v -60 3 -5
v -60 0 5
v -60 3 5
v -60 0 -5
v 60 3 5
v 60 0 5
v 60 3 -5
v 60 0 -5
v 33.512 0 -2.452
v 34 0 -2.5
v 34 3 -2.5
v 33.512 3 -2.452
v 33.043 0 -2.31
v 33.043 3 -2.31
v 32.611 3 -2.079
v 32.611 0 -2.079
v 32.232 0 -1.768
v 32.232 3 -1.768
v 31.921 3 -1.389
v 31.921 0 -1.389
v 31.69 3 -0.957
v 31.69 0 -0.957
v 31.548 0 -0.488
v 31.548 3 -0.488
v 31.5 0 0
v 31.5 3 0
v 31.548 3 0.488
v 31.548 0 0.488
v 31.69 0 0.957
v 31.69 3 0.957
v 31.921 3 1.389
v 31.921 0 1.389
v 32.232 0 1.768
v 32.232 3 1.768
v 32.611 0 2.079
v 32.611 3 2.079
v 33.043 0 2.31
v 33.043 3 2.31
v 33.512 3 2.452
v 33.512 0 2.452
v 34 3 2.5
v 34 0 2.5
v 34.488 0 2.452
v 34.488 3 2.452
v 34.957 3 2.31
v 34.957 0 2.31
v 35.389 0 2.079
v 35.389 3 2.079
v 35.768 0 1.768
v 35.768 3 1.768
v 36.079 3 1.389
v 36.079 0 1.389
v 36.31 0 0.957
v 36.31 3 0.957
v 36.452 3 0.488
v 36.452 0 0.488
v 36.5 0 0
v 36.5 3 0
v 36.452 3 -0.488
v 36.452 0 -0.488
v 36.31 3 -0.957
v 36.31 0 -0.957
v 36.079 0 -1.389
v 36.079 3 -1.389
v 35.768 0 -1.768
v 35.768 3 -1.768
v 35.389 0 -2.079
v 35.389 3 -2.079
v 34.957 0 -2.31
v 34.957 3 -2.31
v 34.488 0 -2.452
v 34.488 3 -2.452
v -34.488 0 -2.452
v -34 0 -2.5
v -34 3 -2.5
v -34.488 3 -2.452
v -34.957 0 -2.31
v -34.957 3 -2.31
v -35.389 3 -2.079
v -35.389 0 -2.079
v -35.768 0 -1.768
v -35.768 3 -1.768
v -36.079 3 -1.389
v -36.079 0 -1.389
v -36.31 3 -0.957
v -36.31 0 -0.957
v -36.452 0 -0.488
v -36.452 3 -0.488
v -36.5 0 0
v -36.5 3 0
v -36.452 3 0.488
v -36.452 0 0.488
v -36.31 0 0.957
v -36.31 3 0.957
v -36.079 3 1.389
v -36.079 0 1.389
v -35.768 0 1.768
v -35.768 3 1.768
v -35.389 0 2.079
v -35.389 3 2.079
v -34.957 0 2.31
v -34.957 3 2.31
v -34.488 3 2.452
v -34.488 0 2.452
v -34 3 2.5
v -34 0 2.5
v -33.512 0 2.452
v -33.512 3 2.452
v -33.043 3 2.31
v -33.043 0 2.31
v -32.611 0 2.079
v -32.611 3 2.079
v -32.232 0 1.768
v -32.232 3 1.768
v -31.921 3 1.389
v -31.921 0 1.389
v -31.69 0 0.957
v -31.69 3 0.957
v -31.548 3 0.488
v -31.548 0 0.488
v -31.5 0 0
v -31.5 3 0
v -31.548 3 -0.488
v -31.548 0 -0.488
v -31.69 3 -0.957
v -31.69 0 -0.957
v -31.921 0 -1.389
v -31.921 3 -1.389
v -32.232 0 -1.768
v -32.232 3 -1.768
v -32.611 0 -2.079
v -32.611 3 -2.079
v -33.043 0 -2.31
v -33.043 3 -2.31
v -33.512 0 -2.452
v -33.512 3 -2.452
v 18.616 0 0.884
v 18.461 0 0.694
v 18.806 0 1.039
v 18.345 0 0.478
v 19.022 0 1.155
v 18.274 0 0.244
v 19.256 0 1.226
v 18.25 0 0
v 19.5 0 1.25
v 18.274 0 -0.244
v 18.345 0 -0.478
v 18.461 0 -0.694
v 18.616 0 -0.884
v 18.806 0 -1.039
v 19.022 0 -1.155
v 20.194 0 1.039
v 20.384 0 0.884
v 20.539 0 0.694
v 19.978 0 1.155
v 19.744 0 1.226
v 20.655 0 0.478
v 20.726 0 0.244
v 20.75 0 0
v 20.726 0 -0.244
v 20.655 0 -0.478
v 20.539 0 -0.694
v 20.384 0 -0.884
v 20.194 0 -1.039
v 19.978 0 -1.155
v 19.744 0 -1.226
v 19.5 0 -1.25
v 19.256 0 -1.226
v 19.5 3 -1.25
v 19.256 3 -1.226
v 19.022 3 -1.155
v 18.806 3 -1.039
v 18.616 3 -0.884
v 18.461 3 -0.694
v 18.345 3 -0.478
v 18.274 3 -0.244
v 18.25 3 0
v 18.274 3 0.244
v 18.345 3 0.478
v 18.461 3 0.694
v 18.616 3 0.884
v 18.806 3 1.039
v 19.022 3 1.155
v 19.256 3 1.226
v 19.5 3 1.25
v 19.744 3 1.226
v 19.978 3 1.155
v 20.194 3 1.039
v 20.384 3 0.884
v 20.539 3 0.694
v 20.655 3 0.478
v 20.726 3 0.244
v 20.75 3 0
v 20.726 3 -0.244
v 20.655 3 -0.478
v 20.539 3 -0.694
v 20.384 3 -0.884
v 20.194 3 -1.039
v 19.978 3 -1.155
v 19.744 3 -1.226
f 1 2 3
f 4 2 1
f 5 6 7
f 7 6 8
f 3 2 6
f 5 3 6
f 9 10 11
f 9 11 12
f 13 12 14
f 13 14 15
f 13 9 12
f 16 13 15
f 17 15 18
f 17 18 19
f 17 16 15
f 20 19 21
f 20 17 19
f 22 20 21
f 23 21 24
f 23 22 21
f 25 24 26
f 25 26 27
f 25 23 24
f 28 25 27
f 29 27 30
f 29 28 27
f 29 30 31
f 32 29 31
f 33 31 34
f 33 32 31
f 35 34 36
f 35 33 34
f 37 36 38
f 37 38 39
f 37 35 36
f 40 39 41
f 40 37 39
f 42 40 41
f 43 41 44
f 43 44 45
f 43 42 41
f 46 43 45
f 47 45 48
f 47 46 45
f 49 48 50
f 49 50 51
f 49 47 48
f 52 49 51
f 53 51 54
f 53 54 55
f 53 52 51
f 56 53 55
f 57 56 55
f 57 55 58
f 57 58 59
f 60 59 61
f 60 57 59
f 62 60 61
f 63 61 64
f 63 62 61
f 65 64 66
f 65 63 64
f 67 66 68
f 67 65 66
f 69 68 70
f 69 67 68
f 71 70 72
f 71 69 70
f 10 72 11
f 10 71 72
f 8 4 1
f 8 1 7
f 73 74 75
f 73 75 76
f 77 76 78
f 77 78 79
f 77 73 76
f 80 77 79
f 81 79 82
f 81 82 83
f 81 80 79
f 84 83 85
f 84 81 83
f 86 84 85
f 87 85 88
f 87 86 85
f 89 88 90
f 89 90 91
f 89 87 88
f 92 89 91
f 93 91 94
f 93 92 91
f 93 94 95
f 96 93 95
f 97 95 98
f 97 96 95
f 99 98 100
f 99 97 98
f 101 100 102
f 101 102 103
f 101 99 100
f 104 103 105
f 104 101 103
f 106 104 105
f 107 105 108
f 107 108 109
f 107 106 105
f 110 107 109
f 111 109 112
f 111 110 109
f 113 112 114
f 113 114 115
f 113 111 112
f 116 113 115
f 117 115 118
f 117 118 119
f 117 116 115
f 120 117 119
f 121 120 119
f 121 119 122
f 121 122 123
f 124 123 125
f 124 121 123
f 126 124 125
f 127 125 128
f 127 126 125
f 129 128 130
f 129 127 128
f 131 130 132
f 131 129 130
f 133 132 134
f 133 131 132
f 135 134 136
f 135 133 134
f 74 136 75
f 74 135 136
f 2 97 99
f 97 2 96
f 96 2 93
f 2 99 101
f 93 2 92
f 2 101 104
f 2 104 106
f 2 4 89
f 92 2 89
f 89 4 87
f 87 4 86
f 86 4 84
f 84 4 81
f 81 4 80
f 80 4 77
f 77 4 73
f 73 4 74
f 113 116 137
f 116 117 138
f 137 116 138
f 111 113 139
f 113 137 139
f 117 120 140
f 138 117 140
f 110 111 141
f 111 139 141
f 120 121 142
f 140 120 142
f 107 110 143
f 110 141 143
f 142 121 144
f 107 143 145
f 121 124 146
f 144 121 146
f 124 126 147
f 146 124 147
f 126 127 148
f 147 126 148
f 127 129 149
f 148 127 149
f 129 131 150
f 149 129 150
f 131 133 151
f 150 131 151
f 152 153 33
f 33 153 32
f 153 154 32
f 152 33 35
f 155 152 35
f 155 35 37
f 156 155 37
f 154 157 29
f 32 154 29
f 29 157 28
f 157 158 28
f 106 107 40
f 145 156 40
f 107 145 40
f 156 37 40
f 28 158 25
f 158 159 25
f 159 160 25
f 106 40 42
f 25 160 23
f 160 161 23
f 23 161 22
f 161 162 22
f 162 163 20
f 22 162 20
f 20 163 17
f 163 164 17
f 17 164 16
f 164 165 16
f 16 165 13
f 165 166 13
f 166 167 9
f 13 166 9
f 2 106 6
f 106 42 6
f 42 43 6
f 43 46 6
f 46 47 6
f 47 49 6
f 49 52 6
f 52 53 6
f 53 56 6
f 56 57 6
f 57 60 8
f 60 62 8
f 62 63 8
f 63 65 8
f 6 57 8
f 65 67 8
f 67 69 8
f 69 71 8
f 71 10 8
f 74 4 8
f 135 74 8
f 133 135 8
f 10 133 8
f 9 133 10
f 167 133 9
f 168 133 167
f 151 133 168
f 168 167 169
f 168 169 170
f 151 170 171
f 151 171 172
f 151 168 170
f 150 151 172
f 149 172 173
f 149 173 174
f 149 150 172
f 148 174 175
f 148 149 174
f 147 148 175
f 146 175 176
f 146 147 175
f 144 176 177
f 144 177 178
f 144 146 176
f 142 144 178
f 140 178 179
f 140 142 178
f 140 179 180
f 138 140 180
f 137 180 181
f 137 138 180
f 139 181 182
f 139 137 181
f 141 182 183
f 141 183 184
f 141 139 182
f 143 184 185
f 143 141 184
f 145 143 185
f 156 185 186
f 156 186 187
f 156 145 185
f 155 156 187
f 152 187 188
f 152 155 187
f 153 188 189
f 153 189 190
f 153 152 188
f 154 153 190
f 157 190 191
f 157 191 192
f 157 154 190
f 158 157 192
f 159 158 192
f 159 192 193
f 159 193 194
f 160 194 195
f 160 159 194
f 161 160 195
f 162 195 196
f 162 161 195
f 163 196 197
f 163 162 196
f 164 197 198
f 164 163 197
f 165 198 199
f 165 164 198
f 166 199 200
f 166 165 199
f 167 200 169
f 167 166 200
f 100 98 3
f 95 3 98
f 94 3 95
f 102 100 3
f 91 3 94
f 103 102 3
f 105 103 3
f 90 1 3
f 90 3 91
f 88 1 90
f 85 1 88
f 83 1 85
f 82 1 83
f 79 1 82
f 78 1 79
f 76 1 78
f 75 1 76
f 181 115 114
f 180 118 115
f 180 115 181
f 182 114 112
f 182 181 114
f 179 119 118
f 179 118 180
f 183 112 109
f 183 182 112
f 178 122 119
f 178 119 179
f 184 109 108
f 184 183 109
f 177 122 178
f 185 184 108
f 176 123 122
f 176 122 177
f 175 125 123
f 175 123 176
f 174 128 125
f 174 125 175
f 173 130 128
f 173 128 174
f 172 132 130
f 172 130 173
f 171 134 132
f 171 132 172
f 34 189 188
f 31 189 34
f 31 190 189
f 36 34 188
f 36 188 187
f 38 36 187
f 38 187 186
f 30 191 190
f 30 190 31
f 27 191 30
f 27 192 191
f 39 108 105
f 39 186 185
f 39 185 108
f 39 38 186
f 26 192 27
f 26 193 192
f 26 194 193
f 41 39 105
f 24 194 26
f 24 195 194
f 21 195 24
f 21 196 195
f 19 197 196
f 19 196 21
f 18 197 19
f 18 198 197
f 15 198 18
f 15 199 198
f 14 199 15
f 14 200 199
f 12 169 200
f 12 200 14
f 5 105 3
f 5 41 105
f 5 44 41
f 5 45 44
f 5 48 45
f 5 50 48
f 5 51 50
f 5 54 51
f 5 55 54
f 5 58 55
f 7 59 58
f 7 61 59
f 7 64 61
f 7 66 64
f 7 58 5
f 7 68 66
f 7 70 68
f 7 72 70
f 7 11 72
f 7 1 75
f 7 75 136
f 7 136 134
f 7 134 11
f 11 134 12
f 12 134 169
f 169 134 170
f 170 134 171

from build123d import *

# Parameters (mm, degrees)
SKETCH3_W           = 120
SKETCH3_H           = 10
BOSS_EXTRUDE1_DEPTH = 3
SKETCH5_R           = 2.5
SKETCH5_R_2         = 1.25
CUT_EXTRUDE1_DEPTH  = 3


with BuildPart() as part:
    # Sketch3 → Boss-Extrude1 (new body)
    with BuildSketch(Plane(origin=(0, 0, 0), x_dir=(1, 0, 0), z_dir=(0, 1, 0))):
        Rectangle(SKETCH3_W, SKETCH3_H)
    extrude(amount=BOSS_EXTRUDE1_DEPTH)

    # Sketch5 → Cut-Extrude1 (cut)
    with BuildSketch(Plane(origin=(0, 0, 0), x_dir=(1, 0, 0), z_dir=(0, 1, 0))):
        with Locations(Location((-34, 0, 0), (0, 0, 90))):
            Circle(SKETCH5_R)
        with Locations(Location((34, 0, 0), (0, 0, 90))):
            Circle(SKETCH5_R)
        with Locations(Location((19.5, 0, 0), (0, 0, 90))):
            Circle(SKETCH5_R_2)
    extrude(amount=CUT_EXTRUDE1_DEPTH, mode=Mode.SUBTRACT)


solid = part.part
